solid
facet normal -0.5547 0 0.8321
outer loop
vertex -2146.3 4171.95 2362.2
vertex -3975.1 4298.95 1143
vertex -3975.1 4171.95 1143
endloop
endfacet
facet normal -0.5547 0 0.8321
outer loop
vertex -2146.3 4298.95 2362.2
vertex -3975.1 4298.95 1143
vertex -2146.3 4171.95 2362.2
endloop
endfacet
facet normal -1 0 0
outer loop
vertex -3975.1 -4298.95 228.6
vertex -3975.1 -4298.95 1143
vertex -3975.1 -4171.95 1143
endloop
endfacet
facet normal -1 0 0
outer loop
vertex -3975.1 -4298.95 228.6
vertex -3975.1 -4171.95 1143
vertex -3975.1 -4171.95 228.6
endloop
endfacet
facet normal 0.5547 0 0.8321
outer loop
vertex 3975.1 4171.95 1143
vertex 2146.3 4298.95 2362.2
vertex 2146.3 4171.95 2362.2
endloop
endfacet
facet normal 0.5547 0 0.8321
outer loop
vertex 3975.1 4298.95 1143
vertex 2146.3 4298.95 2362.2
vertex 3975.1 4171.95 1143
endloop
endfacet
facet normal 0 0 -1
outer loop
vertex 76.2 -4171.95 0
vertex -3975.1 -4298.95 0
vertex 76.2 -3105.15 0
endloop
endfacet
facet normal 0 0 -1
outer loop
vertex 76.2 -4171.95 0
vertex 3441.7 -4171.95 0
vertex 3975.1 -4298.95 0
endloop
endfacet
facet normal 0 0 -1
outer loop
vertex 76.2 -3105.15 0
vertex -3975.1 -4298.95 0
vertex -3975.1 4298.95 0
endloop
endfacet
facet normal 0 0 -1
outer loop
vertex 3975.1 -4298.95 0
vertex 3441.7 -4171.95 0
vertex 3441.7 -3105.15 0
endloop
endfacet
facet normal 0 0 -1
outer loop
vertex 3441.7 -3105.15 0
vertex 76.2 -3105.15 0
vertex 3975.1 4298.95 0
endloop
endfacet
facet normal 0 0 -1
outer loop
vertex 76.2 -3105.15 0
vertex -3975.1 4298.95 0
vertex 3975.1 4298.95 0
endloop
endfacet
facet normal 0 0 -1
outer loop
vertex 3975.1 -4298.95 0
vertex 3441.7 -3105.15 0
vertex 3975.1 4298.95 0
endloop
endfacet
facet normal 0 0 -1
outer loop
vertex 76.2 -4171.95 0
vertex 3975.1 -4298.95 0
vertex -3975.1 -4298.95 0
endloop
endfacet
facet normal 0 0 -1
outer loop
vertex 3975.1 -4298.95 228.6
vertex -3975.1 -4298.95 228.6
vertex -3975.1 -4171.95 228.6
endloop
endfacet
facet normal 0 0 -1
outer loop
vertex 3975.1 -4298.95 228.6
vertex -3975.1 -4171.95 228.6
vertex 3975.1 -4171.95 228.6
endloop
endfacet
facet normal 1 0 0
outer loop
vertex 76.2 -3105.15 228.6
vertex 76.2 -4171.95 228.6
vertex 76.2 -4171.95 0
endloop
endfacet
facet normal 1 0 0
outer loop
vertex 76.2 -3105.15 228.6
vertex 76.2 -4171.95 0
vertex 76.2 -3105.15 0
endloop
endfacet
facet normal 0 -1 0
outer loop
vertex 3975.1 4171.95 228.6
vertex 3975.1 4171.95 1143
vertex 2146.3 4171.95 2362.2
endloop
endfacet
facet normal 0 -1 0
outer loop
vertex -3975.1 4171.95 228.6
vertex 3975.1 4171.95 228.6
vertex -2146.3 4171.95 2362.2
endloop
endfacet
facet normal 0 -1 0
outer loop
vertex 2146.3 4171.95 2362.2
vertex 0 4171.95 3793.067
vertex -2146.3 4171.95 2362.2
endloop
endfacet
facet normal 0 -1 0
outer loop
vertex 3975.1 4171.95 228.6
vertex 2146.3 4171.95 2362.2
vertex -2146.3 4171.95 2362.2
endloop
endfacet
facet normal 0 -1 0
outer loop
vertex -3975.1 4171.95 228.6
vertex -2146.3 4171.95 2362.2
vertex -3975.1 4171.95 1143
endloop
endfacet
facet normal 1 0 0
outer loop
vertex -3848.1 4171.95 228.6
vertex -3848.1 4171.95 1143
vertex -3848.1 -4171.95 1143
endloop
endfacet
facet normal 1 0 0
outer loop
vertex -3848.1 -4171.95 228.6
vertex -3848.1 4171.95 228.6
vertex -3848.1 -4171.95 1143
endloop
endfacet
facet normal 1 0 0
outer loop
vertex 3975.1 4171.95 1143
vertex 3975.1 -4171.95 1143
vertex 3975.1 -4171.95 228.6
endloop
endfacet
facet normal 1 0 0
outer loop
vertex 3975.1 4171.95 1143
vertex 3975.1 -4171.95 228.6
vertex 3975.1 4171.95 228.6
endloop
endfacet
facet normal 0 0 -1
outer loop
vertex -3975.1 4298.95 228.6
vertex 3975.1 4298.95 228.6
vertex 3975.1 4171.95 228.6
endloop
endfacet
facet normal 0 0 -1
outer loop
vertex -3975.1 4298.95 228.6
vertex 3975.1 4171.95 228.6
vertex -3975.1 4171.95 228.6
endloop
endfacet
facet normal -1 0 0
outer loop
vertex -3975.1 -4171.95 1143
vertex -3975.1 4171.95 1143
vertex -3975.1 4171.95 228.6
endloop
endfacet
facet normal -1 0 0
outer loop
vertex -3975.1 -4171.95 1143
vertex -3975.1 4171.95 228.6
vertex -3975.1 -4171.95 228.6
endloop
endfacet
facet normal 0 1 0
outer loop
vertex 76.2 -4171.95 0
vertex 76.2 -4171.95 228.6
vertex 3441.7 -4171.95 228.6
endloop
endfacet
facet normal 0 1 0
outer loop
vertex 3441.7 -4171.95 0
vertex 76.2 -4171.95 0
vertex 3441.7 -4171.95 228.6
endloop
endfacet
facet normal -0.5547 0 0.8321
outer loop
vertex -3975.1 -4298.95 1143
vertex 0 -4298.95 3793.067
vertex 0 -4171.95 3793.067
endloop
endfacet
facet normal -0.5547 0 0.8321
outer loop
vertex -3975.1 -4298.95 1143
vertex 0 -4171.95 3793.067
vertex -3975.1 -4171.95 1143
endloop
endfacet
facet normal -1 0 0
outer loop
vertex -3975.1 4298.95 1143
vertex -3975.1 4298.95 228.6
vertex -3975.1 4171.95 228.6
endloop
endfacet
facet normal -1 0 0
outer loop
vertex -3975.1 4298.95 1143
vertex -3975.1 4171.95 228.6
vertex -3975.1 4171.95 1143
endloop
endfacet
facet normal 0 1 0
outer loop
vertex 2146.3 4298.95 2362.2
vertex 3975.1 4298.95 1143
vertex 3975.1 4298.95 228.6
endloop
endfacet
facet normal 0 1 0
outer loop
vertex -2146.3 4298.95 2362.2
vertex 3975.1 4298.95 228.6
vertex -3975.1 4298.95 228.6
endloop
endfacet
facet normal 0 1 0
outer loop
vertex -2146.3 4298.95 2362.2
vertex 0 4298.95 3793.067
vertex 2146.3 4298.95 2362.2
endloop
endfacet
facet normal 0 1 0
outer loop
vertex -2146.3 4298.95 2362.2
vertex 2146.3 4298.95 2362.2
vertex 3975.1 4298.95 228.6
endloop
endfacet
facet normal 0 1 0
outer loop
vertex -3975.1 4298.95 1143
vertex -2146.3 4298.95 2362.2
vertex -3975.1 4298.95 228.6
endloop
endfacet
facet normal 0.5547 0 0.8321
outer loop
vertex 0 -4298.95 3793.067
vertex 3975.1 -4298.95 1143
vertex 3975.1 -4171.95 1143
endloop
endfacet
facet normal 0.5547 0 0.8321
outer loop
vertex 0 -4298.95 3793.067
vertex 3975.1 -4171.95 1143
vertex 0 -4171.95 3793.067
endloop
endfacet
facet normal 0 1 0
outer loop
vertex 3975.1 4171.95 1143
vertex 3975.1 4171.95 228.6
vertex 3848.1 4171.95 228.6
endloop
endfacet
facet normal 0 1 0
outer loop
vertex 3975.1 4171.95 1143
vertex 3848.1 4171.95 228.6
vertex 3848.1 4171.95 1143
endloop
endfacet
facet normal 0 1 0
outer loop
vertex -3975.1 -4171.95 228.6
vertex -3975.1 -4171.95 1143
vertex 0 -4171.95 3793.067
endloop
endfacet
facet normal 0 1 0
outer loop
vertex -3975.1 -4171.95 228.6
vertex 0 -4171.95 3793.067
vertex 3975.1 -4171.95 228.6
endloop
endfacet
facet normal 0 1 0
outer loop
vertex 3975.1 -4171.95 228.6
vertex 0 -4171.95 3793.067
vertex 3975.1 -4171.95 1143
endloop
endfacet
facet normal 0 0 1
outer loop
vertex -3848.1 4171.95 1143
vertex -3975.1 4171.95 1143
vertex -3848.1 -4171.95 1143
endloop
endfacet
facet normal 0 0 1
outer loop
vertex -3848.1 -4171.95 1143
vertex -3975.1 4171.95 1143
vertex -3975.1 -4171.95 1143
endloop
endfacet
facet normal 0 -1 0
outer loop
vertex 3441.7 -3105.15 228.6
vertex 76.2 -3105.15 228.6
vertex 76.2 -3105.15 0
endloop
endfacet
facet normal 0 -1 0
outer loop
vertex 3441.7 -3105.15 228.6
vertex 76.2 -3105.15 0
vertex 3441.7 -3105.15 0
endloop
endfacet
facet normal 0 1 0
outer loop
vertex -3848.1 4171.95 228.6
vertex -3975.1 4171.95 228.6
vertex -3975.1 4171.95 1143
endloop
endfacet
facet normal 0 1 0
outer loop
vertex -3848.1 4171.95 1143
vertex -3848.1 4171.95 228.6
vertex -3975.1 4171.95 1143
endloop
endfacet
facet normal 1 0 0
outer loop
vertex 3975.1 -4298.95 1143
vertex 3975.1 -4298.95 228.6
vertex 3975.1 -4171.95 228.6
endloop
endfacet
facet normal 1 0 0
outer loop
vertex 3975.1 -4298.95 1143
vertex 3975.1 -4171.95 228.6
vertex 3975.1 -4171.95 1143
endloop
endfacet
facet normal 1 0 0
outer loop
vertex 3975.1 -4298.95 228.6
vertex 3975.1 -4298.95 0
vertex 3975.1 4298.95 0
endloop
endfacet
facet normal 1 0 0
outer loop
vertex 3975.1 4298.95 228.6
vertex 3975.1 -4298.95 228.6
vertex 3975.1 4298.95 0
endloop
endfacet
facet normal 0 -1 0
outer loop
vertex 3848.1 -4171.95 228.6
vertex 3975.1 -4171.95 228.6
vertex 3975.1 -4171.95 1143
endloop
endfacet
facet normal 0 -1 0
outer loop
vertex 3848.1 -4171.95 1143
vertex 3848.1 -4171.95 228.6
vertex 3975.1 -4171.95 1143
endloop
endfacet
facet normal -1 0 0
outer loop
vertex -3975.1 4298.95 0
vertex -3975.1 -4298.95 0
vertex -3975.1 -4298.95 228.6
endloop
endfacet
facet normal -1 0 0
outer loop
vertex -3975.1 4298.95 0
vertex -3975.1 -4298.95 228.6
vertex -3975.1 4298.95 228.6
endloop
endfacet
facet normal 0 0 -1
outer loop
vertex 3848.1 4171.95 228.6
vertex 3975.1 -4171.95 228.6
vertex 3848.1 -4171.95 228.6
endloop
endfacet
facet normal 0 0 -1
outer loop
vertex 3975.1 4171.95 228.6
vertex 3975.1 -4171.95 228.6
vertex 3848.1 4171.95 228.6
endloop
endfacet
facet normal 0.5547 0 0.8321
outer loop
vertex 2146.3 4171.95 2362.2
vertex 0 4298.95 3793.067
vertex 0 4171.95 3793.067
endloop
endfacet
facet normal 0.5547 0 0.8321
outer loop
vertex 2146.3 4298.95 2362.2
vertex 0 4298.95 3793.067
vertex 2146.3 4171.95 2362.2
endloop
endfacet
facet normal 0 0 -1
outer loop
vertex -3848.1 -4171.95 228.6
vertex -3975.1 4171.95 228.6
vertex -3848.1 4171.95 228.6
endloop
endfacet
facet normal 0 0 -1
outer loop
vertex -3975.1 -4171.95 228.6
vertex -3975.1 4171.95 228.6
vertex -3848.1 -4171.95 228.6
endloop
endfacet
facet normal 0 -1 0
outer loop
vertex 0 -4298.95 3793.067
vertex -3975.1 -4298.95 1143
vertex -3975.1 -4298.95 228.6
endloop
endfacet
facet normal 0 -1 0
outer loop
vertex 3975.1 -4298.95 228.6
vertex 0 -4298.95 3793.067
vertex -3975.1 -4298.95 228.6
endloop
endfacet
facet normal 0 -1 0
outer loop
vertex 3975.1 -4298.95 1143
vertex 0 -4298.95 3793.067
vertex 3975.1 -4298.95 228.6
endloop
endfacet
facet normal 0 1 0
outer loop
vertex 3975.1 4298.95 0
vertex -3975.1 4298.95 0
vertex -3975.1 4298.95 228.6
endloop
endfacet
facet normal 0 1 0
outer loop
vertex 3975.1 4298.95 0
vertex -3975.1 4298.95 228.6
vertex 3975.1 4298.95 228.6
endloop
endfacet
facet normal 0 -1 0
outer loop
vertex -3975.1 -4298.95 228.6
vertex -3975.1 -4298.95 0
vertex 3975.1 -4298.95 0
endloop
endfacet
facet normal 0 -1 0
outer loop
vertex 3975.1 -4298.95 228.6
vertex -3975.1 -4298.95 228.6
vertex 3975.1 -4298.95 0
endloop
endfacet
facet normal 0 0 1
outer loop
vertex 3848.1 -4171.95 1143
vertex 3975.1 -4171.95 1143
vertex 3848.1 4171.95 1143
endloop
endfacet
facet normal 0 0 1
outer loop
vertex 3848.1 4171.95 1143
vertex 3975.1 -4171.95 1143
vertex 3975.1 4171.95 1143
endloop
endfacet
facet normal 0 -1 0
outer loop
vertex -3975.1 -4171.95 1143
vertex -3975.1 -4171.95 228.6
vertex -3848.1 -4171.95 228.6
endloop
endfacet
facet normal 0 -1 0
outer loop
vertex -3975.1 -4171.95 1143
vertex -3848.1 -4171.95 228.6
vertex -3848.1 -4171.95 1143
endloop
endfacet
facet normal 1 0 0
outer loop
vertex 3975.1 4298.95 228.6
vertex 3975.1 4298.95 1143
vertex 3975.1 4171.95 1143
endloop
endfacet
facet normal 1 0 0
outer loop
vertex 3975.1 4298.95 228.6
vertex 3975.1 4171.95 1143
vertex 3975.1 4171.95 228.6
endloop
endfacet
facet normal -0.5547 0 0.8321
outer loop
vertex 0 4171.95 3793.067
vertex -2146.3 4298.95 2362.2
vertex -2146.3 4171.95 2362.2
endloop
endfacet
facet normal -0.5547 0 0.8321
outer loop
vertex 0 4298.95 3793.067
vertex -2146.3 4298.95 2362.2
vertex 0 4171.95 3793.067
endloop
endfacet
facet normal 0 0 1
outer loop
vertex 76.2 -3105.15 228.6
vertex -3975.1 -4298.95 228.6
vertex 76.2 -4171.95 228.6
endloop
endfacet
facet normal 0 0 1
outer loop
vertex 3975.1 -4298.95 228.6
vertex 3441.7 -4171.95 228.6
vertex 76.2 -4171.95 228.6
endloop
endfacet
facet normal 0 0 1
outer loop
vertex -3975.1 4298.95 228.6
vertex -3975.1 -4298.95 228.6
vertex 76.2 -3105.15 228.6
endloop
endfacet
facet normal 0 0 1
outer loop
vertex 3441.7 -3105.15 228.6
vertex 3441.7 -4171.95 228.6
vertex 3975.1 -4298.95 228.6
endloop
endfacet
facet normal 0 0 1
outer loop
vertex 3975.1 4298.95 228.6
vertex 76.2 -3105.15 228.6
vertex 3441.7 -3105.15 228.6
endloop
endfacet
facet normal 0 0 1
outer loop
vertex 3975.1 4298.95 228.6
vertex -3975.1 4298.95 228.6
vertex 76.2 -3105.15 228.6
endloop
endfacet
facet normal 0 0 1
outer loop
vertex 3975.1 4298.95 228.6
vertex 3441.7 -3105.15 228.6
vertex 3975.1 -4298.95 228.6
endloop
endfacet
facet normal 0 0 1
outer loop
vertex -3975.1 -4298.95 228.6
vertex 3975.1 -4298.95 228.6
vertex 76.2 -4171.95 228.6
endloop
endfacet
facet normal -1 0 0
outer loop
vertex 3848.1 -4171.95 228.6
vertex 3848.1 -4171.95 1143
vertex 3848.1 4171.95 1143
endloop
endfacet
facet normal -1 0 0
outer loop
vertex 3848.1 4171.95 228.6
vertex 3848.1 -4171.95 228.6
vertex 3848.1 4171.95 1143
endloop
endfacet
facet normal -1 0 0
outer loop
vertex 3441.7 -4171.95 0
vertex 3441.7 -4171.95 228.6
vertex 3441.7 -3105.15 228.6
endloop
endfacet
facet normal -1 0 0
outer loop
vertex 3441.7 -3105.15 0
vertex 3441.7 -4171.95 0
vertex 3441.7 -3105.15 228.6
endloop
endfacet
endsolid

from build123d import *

# Parameters (mm, degrees)
F0_W      = 7950.2
F0_H      = 8597.9
F1_DEPTH  = 228.6
F2_W      = 3365.5
F2_H      = 1066.8
F3_DEPTH  = 228.6
F5_DEPTH  = 127
F7_DEPTH  = 127
F8_W      = 8343.9
F8_H      = 914.4
F9_DEPTH  = 127
F10_W     = 8343.9
F10_H     = 914.4
F11_DEPTH = 127


with BuildPart() as f1:
    # F0 (on Top) → F1 (new body)
    with BuildSketch(Plane.XY):
        Rectangle(F0_W, F0_H)
    extrude(amount=F1_DEPTH)

    # F2 (on face) → F3 (cut, through all)
    with BuildSketch(Plane.XY.offset(228.6)):
        with Locations((1758.95, -3638.55)):
            Rectangle(F2_W, F2_H)
    extrude(amount=-F3_DEPTH, mode=Mode.SUBTRACT)


with BuildPart() as f5:
    # F4 (on face) → F5 (new body)
    with BuildSketch(Plane.XZ.offset(4298.95)):
        Polygon((-3975.1, 1143), (-3975.1, 228.6), (3975.1, 228.6), (3975.1, 1143), (0, 3793.066667), align=None)
    extrude(amount=-F5_DEPTH)


with BuildPart() as f7:
    # F6 (on face) → F7 (new body)
    with BuildSketch(Plane(origin=(0, 4298.95, 0), x_dir=(-1, 0, 0), z_dir=(0, 1, 0))):
        Polygon((-3975.1, 1143), (-3975.1, 228.6), (3975.1, 228.6), (3975.1, 1143), (2146.3, 2362.2), (-2146.3, 2362.2), align=None)
        Polygon((0, 3793.066667), (-2146.3, 2362.2), (2146.3, 2362.2), align=None)
    extrude(amount=-F7_DEPTH)


with BuildPart() as f9:
    # F8 (on face) → F9 (new body)
    with BuildSketch(Plane(origin=(-3975.1, 0, 0), x_dir=(0, -1, 0), z_dir=(-1, 0, 0))):
        with Locations((0, 685.8)):
            Rectangle(F8_W, F8_H)
    extrude(amount=-F9_DEPTH)


with BuildPart() as f11:
    # F10 (on face) → F11 (new body)
    with BuildSketch(Plane.YZ.offset(3975.1)):
        with Locations((0, 685.8)):
            Rectangle(F10_W, F10_H)
    extrude(amount=-F11_DEPTH)


solid = Compound([f1.part, f5.part, f7.part, f9.part, f11.part])
